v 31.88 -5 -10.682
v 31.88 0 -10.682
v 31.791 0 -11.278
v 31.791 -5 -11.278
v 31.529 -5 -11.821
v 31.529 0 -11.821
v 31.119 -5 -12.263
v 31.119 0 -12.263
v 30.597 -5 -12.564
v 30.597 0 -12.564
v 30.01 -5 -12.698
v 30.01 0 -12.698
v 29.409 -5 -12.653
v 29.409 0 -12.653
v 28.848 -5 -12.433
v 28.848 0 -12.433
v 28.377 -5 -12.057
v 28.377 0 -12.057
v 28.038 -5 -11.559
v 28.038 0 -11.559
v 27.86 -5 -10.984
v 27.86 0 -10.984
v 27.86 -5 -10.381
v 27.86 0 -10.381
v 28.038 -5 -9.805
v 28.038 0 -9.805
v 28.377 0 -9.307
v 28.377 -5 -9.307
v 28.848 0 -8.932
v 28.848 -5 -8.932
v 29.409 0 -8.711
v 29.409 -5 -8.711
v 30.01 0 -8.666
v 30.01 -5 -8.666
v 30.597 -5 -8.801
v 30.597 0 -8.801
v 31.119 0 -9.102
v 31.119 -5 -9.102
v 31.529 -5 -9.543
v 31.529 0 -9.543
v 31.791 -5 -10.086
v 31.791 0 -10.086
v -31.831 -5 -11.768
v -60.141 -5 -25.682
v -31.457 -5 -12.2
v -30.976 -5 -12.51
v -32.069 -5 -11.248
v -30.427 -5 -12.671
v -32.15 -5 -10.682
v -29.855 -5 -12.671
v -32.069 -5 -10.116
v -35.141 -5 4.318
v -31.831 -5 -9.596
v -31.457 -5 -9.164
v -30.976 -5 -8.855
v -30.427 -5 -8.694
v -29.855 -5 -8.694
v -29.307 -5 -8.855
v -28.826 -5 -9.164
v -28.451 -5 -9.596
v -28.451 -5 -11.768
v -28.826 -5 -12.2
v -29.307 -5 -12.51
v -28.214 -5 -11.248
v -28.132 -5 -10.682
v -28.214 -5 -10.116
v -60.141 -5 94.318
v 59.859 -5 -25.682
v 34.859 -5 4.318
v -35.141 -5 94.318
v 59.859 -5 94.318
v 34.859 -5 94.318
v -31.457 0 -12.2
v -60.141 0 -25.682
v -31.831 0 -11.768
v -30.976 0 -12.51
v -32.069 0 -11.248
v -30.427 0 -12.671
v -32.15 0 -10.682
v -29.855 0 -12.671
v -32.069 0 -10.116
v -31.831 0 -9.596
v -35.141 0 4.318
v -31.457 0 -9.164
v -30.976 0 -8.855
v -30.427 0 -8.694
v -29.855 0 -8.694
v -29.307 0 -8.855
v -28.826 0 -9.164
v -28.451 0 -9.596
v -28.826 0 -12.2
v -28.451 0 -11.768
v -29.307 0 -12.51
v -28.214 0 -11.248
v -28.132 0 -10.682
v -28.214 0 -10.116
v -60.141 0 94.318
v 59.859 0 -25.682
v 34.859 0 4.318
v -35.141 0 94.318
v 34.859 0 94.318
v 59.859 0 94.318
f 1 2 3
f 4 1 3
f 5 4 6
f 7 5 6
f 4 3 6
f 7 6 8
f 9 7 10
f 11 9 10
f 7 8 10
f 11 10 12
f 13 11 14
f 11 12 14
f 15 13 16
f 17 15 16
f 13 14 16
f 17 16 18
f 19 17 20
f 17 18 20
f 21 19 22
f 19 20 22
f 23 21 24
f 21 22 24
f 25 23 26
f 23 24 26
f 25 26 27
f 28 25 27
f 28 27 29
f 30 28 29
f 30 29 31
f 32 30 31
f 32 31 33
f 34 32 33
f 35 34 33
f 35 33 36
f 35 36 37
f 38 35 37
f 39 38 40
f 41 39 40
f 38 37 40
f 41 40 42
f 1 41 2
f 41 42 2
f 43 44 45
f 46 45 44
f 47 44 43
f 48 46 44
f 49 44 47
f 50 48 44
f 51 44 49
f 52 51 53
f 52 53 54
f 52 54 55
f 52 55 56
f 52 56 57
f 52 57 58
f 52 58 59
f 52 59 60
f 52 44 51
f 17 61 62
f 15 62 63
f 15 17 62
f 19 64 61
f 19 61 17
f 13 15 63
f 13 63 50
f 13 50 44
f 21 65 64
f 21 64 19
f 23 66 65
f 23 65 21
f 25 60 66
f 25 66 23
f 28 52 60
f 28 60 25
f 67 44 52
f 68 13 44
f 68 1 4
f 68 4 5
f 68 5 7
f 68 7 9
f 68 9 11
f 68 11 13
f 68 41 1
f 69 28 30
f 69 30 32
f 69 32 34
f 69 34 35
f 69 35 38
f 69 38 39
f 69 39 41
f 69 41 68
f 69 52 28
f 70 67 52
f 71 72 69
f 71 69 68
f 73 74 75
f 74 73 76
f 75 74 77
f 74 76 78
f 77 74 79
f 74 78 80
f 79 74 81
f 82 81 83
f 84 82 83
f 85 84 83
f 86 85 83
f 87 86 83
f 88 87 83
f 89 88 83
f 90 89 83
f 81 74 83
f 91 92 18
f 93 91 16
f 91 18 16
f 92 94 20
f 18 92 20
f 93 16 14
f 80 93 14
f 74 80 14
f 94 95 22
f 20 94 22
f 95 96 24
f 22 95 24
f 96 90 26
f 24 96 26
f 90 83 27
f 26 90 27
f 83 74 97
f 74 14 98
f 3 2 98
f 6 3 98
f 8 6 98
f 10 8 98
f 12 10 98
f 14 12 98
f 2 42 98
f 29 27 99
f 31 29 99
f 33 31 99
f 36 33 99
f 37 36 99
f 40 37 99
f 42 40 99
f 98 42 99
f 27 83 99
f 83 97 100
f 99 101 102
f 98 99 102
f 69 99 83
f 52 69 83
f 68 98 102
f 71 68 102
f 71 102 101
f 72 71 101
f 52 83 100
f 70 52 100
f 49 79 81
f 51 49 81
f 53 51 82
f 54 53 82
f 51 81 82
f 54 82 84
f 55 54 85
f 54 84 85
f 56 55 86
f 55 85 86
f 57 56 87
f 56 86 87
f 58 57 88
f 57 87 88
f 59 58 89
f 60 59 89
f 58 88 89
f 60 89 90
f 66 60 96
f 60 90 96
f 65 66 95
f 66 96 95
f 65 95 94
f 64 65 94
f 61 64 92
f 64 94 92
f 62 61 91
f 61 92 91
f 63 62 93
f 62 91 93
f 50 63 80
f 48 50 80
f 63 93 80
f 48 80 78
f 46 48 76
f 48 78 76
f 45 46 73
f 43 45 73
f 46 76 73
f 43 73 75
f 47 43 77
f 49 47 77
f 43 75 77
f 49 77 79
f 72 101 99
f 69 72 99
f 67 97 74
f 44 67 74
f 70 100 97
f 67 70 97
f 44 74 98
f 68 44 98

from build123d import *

# Parameters (mm, degrees)
F1_DEPTH = 5


with BuildPart() as f1:
    # F0 (on Front) → F1 (new body)
    with BuildSketch(Plane.XZ):
        Polygon((-60.1411065459, 94.3177779019), (-60.1411065459, -25.6822220981), (59.8588934541, -25.6822220981), (59.8588934541, -10.6822220981), (59.8588934541, 4.3177779019), (59.8588934541, 94.3177779019), (34.8588934541, 94.3177779019), (34.8588934541, 4.3177779019), (-35.1411065459, 4.3177779019), (-35.1411065459, 94.3177779019), align=None)
        with BuildLine():
            ThreePointArc((-32.1499717459, -10.6822220981), (-30.1411065459, -8.6733568981), (-28.132241346, -10.6822220981))
            ThreePointArc((-28.132241346, -10.6822220981), (-30.1411065459, -12.6910872981), (-32.1499717459, -10.6822220981))
        make_face(mode=Mode.SUBTRACT)
        with BuildLine():
            ThreePointArc((27.8374452822, -10.6822220981), (29.8588934541, -8.6607739263), (31.8803416259, -10.6822220981))
            ThreePointArc((31.8803416259, -10.6822220981), (29.8588934541, -12.70367027), (27.8374452822, -10.6822220981))
        make_face(mode=Mode.SUBTRACT)
    extrude(amount=F1_DEPTH)


solid = f1.part
